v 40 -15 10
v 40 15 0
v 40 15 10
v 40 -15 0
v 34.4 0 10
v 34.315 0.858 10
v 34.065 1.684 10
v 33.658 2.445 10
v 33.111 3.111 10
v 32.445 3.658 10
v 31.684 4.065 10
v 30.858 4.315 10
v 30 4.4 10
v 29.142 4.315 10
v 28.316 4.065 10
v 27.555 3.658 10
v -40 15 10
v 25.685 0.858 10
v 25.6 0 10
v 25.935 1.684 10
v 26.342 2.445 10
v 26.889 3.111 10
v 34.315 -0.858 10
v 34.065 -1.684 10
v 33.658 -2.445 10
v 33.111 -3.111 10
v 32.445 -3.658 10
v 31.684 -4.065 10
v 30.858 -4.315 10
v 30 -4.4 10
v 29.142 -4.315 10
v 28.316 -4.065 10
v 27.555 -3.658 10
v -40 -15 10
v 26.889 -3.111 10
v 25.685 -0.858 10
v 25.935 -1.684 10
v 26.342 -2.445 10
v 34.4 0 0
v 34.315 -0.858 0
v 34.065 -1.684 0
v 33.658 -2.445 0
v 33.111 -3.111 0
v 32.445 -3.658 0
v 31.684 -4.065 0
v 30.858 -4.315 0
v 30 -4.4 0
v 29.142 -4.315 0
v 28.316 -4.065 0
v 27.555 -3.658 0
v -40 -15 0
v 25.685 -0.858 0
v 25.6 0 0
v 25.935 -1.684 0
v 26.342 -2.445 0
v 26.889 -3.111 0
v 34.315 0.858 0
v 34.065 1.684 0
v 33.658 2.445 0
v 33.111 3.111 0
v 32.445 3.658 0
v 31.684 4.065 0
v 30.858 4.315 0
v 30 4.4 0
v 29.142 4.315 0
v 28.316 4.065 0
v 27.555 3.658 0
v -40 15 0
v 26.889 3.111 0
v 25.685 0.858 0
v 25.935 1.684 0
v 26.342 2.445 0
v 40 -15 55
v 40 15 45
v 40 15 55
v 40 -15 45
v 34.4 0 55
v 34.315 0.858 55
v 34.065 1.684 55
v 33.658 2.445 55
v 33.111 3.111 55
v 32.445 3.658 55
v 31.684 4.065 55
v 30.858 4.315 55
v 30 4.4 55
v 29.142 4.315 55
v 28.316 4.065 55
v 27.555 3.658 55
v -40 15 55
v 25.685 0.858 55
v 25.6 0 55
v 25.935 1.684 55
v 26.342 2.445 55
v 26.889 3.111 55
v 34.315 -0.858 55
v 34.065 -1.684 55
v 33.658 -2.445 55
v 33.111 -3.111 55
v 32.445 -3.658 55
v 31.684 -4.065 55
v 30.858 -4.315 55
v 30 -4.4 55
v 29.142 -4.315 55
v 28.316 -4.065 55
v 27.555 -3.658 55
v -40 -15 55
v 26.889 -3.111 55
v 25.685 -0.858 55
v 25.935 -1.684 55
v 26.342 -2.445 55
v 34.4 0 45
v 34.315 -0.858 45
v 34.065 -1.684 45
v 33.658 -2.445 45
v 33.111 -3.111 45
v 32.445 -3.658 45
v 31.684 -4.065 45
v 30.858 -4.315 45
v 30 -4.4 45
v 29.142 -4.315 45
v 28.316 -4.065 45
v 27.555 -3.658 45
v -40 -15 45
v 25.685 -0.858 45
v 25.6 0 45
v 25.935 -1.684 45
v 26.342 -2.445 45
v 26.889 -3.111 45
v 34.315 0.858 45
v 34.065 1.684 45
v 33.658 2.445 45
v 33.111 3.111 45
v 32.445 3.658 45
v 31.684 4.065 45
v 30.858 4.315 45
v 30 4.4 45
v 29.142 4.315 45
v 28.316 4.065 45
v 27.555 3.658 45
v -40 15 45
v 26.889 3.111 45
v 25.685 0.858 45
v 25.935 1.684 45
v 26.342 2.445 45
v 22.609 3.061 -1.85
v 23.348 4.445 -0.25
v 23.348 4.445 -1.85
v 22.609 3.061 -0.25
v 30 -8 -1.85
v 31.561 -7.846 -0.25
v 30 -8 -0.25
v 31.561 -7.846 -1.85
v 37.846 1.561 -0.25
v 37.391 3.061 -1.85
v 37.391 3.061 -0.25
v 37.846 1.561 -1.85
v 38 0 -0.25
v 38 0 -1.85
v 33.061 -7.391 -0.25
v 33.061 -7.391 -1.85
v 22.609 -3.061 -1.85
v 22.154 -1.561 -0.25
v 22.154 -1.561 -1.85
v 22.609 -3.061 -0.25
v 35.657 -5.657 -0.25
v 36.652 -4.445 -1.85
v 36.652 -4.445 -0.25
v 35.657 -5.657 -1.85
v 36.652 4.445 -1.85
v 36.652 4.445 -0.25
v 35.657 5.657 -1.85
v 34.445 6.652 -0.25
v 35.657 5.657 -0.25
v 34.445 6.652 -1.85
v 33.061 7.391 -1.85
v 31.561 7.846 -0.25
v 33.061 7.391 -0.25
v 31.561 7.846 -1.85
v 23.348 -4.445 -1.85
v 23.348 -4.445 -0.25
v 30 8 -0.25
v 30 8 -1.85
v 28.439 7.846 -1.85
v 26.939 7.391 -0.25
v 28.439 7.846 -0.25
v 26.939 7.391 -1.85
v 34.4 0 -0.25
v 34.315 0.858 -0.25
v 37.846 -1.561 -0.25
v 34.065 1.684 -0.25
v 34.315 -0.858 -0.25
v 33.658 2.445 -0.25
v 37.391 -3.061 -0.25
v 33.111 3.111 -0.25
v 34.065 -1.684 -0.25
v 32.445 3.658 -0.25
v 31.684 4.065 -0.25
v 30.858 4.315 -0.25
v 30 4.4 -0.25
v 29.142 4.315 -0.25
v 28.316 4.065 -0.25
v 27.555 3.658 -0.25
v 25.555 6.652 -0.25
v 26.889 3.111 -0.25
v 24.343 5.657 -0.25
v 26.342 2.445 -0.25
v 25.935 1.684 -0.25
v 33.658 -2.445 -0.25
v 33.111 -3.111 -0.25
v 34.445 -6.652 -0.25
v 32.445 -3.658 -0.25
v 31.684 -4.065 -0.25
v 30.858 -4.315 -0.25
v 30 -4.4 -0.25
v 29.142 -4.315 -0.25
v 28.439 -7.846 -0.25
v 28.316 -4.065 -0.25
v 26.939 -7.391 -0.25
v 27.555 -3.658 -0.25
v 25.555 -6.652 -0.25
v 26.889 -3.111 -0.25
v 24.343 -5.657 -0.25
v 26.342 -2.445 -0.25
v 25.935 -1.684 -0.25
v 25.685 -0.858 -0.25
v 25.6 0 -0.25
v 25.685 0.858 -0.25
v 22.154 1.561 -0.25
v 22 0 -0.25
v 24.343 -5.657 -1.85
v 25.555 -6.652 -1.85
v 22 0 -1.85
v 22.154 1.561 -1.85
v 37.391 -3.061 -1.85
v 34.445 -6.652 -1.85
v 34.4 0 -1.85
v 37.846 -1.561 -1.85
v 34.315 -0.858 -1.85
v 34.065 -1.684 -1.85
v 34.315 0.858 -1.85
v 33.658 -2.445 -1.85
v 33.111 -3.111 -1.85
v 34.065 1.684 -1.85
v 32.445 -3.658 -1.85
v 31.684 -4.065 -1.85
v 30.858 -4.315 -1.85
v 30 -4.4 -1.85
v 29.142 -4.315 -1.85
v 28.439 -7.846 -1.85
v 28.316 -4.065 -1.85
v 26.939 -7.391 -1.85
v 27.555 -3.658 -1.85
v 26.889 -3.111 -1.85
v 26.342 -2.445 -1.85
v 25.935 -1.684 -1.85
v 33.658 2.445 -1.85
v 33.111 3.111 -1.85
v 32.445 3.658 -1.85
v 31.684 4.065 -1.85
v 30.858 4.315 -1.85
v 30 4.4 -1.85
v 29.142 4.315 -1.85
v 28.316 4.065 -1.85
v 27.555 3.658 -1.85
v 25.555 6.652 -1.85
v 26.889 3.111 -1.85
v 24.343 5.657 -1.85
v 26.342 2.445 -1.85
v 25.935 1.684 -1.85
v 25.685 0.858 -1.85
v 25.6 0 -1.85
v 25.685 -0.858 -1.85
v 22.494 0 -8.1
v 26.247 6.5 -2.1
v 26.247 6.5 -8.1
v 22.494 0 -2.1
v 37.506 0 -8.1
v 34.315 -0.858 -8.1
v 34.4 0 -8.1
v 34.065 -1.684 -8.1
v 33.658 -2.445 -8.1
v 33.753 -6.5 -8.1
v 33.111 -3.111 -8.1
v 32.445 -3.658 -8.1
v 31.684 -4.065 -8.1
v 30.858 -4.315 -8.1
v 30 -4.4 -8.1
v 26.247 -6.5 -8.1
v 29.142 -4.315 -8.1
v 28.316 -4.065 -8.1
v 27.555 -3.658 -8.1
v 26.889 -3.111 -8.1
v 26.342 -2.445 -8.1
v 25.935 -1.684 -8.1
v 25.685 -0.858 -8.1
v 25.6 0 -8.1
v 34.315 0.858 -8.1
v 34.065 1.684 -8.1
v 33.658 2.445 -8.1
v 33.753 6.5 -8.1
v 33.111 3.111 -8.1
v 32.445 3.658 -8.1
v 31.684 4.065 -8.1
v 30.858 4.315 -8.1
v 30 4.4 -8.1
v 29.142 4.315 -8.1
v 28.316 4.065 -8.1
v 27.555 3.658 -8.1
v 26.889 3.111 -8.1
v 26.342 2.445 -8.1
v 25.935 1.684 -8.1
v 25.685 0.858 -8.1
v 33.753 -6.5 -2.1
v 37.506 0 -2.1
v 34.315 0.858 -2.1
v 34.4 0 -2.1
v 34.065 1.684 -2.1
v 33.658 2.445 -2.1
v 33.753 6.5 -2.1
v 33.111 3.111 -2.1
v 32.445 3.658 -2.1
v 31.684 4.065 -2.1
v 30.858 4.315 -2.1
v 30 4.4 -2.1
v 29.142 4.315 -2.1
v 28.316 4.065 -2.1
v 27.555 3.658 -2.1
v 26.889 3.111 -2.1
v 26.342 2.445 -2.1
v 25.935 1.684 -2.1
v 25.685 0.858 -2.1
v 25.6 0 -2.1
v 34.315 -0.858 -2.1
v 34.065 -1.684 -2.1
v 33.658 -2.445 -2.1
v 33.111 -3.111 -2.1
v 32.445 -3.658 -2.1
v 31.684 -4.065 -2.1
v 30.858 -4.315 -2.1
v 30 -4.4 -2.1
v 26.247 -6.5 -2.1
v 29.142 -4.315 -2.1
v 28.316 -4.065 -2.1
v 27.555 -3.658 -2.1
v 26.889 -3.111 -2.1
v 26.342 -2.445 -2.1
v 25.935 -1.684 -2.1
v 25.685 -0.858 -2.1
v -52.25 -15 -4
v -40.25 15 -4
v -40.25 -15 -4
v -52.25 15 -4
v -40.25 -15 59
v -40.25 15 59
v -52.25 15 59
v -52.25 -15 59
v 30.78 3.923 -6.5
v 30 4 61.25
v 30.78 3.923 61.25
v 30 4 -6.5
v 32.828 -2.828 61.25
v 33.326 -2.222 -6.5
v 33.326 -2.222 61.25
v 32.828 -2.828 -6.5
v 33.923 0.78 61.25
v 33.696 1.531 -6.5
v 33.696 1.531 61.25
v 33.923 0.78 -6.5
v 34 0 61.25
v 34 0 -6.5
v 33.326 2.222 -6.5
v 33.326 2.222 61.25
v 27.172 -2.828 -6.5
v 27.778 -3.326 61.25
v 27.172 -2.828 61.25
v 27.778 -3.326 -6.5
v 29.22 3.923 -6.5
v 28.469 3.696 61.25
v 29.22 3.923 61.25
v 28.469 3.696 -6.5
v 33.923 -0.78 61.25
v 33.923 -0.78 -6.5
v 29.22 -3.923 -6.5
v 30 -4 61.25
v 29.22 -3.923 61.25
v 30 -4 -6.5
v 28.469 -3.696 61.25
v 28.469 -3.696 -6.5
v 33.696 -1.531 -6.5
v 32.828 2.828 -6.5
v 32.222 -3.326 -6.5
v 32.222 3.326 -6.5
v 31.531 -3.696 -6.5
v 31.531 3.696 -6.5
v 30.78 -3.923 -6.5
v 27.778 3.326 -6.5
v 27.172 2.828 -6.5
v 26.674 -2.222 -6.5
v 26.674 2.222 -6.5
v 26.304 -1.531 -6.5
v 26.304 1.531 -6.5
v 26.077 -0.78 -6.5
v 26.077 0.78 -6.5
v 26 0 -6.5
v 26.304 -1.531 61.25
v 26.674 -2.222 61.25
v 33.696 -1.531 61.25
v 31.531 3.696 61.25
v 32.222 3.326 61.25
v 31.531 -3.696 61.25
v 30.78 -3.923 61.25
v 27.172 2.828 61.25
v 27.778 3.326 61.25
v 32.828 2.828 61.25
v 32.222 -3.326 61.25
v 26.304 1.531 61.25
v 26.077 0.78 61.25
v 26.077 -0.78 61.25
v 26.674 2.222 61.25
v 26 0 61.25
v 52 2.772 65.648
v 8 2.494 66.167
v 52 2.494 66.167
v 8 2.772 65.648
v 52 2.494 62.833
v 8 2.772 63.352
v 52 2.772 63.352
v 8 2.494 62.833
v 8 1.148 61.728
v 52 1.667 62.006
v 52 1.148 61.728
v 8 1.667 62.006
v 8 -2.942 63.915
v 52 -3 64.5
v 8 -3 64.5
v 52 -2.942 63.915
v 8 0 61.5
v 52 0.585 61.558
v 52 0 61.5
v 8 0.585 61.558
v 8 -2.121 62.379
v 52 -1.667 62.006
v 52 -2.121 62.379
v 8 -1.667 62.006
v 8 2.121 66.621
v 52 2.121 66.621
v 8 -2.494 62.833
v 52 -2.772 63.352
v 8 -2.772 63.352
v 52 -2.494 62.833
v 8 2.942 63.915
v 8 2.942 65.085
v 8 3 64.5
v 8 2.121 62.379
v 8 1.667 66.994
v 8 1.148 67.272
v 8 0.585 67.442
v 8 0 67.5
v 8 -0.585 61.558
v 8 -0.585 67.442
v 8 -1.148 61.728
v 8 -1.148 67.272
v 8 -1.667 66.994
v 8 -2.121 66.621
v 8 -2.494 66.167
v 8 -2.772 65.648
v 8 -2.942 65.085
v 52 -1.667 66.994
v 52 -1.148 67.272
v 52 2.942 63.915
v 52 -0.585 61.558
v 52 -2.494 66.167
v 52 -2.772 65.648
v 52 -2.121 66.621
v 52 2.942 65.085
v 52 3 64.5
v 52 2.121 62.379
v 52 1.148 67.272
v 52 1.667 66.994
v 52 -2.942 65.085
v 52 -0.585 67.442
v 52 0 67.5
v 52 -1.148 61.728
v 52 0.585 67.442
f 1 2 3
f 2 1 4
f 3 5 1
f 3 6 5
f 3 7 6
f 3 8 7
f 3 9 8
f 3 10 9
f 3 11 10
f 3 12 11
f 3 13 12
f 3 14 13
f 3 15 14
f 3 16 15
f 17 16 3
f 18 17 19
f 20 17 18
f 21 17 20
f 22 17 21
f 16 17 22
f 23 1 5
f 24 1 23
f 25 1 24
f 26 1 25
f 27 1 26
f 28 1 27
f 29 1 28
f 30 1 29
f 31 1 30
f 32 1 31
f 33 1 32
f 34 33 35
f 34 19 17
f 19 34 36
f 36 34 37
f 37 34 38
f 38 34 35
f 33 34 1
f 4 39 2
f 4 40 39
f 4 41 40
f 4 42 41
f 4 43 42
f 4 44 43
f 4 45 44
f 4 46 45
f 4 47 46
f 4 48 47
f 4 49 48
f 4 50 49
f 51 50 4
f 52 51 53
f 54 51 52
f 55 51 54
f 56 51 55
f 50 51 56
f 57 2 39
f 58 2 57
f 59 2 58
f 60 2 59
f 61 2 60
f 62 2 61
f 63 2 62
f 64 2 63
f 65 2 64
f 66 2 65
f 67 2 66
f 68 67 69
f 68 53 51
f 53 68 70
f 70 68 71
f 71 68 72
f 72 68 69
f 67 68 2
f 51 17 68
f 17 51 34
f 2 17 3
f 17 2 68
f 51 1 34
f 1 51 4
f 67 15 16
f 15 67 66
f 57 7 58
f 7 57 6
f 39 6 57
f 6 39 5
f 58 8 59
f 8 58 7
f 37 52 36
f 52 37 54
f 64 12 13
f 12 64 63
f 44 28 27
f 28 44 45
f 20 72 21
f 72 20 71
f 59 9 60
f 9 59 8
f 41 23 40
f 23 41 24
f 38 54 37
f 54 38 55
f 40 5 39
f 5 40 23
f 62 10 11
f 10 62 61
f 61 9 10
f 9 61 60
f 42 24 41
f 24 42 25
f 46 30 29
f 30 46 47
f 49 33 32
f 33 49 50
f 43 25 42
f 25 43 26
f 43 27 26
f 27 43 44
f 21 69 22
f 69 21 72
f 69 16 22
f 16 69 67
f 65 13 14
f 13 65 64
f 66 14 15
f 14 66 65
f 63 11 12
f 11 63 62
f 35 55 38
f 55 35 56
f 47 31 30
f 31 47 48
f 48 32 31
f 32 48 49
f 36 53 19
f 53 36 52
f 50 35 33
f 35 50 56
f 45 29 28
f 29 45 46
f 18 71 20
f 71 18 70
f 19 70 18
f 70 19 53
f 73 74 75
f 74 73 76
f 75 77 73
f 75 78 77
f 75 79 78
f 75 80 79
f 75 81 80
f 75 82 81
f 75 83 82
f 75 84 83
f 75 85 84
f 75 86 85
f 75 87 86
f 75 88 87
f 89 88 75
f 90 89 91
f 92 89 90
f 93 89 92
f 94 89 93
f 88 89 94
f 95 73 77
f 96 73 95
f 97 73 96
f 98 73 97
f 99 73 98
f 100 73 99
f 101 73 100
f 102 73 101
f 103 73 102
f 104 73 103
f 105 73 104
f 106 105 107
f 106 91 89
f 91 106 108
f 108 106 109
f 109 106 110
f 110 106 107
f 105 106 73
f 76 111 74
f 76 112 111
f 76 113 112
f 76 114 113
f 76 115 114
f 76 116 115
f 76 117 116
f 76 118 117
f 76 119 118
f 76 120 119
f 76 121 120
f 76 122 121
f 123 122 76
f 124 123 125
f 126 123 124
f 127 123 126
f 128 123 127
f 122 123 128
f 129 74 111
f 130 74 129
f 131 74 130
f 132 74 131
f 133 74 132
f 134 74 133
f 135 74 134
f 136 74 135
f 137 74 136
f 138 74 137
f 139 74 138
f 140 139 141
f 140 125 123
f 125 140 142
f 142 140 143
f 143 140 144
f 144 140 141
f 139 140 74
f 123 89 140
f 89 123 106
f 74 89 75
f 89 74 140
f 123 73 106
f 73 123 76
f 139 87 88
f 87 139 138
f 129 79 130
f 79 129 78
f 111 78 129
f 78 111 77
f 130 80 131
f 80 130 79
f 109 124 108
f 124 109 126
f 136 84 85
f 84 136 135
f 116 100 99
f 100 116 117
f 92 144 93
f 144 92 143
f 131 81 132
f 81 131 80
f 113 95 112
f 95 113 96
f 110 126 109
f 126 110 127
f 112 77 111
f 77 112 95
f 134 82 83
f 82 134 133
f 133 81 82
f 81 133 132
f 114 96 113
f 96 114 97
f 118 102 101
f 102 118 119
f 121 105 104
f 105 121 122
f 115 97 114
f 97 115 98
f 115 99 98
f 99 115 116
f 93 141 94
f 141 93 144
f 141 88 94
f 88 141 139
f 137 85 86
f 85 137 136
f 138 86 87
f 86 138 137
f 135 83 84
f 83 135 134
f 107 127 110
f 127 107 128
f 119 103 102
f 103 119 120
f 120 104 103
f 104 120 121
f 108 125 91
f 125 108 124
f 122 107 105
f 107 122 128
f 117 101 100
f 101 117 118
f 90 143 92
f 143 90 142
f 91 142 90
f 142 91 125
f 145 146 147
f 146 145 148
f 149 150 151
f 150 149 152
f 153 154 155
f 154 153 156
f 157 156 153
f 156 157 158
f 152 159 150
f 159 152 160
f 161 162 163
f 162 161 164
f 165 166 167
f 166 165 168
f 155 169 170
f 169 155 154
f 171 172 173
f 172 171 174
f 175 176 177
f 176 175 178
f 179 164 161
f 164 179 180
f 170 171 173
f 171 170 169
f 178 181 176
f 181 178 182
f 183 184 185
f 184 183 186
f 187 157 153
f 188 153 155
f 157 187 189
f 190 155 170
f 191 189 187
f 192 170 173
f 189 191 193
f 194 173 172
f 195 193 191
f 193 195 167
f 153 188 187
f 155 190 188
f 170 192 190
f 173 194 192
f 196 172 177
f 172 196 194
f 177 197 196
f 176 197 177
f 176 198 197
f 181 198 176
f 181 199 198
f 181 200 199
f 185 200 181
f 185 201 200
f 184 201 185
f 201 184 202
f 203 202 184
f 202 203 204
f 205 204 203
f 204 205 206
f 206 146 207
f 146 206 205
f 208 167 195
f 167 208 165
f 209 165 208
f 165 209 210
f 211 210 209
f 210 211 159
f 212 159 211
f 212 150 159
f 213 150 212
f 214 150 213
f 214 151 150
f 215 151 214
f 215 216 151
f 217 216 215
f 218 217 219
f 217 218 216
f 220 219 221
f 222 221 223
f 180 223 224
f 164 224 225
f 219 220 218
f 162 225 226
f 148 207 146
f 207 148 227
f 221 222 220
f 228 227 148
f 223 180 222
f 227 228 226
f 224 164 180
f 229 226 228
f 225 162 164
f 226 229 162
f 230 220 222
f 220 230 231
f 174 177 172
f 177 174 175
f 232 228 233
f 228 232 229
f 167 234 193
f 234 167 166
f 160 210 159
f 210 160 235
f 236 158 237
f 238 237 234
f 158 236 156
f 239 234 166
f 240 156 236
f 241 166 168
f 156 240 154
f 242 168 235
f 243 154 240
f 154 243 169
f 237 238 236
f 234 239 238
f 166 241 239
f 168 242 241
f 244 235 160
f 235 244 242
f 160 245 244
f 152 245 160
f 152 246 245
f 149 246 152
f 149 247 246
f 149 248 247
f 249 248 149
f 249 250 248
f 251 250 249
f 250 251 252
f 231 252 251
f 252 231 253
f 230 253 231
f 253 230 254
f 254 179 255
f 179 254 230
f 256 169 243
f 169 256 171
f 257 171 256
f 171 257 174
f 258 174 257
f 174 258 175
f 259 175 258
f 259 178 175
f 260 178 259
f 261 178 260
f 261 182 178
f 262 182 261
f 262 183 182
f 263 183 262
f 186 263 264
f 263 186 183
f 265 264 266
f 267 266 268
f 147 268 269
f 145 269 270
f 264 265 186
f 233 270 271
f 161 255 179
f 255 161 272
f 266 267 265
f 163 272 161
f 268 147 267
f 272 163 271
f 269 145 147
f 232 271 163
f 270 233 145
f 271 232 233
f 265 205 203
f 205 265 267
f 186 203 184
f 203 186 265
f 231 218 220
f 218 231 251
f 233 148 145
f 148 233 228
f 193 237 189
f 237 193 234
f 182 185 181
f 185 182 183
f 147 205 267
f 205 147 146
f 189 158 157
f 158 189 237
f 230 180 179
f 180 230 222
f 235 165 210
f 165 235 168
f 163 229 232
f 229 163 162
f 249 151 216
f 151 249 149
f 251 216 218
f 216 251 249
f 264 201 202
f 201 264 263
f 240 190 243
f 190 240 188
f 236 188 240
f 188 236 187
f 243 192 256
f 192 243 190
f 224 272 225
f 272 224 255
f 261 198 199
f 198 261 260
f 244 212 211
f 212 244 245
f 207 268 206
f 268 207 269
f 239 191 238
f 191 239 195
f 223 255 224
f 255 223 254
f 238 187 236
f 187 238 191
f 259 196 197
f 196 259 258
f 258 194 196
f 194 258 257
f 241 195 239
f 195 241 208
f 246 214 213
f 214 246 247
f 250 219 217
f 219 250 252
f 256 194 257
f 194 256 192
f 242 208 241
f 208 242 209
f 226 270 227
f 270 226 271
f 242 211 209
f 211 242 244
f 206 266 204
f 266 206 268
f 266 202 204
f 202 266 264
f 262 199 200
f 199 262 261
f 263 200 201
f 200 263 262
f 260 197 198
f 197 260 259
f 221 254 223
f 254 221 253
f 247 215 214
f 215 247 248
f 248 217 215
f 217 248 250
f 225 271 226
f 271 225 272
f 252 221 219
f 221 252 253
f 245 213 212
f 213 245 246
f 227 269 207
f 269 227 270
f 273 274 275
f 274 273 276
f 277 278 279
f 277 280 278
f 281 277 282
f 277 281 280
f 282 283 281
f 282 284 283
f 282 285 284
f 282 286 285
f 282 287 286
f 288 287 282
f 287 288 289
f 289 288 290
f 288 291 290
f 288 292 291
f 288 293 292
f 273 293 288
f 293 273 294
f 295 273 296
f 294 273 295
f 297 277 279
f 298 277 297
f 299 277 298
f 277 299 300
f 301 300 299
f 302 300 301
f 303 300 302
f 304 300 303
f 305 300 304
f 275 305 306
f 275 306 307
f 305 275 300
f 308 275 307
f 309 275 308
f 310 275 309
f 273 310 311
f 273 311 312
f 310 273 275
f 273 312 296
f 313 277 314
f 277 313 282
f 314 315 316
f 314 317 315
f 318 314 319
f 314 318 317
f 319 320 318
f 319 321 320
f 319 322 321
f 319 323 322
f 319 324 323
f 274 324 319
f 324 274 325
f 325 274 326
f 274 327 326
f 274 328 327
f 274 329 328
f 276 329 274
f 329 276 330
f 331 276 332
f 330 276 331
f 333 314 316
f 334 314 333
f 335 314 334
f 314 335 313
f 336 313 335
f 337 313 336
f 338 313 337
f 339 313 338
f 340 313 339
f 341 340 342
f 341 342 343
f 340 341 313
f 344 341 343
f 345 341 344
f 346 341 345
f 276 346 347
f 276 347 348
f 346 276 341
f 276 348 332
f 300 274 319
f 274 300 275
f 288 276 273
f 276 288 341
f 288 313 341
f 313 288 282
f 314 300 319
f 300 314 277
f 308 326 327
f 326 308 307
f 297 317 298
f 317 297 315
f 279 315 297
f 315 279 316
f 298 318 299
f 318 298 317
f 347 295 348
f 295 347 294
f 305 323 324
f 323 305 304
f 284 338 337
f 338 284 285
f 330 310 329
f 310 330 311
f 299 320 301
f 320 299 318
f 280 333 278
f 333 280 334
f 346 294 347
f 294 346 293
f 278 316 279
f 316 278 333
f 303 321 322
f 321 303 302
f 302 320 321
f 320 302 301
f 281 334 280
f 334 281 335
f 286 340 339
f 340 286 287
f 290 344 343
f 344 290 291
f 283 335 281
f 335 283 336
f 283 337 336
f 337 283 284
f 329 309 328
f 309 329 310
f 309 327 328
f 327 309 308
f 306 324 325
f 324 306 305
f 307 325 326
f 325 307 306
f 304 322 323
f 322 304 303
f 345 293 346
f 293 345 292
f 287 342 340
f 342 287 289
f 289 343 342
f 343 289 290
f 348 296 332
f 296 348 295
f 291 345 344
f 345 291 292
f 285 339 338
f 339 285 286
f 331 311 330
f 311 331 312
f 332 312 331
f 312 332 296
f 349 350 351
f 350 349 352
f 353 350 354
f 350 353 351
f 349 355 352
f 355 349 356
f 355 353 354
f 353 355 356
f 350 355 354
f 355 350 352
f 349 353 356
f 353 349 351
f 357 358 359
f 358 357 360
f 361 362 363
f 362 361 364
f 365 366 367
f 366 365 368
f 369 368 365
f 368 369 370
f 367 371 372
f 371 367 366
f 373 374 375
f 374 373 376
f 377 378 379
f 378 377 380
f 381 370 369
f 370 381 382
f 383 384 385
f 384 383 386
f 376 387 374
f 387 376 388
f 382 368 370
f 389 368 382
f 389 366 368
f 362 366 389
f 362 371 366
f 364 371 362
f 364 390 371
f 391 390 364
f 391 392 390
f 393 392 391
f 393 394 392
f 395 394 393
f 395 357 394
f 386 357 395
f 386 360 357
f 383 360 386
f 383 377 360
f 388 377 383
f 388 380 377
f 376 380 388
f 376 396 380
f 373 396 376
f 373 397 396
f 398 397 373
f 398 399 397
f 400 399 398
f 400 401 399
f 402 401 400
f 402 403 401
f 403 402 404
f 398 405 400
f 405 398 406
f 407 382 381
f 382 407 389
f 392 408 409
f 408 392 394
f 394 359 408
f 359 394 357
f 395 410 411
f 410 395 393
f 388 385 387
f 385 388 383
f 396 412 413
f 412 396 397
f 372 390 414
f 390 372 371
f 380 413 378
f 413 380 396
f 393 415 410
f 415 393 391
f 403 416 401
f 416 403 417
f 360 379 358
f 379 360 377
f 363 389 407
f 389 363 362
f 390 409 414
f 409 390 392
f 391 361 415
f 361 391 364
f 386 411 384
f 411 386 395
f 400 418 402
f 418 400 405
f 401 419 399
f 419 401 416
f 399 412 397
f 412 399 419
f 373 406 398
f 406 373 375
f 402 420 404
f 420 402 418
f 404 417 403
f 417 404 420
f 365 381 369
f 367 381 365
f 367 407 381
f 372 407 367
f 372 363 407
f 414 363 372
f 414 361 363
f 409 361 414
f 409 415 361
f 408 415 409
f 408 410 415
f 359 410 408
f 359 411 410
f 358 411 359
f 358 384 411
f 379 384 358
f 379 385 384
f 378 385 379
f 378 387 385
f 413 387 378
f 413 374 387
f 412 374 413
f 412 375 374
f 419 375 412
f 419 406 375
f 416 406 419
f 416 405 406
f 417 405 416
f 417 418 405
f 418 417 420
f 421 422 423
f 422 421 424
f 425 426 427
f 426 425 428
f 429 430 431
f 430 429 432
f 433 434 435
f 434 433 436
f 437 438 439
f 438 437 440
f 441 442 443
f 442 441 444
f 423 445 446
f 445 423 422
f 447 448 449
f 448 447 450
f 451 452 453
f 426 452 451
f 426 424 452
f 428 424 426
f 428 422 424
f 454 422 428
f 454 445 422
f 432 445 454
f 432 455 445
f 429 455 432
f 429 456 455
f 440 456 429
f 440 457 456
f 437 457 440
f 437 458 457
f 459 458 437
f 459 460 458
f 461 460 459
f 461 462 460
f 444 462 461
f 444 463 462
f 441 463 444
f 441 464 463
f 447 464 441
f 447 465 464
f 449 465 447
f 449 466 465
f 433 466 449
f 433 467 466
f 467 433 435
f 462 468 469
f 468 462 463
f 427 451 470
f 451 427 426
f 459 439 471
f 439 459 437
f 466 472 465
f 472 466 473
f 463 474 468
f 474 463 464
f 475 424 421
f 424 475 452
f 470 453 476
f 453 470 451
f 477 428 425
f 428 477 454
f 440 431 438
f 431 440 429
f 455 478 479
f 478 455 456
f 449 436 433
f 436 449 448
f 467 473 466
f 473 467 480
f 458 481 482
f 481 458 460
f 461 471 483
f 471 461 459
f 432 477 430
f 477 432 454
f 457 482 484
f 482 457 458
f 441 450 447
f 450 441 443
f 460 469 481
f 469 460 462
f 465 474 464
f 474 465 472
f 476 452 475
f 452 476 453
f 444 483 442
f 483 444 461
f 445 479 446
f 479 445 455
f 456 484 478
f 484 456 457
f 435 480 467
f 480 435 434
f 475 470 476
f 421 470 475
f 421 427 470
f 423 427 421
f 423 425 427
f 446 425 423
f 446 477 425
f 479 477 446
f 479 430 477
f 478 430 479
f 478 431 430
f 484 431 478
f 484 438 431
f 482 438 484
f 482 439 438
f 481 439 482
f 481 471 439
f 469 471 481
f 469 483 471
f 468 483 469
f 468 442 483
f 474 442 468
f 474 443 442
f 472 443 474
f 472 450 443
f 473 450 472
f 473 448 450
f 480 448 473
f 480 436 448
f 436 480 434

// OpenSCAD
$fn = 32;

// ------------------------------------------------------------------------
// C clamp: throat 45 mm, screw d8
// Every part is its own module, assembly() places every instance.
// ------------------------------------------------------------------------

// --- part 1 ---
module clamp_arm() {
  difference() {
    translate([-40, -15, 0]) cube([80, 30, 10]);
    translate([30, 0, -1]) cylinder(h = 12, d = 8.8);
  }
}

// --- part 2 ---
module clamp_spine() {
  difference() {
    translate([-31.5, -15, 0]) cube([63, 30, 12]);
  }
}

// --- part 3 ---
module clamp_screw() {
  translate([0, 0, -33.875]) cylinder(h = 67.75, d = 8);
}

// --- part 4 ---
module clamp_washer() {
  difference() {
      translate([0, 0, 0]) cylinder(h = 1.6, d = 16);
      translate([0, 0, -1]) cylinder(h = 3.6, d = 8.8);
    }
}

// --- part 5 ---
module clamp_nut() {
  difference() {
    linear_extrude(height = 6) polygon(points = [[7.506, 0], [3.753, 6.5], [-3.753, 6.5], [-7.506, 0], [-3.753, -6.5], [3.753, -6.5]]);
    translate([0, 0, -1]) cylinder(h = 8, d = 8.8);
  }
}

// --- part 6 ---
module tommy_bar() {
  translate([0, 0, -22]) cylinder(h = 44, d = 6);
}

// --- assembly ---
module assembly() {
  color([0.80, 0.24, 0.20]) translate([0, 0, 0]) rotate([0, 0, 0]) clamp_arm();
  color([0.20, 0.45, 0.75]) translate([0, 0, 45]) rotate([0, 0, 0]) clamp_arm();
  color([0.25, 0.62, 0.32]) translate([-52.25, 0, 27.5]) rotate([0, 90, 0]) clamp_spine();
  color([0.92, 0.70, 0.18]) translate([30, 0, 27.375]) rotate([0, 0, 0]) clamp_screw();
  color([0.58, 0.35, 0.70]) translate([30, 0, -1.85]) rotate([0, 0, 0]) clamp_washer();
  color([0.16, 0.66, 0.66]) translate([30, 0, -8.1]) rotate([0, 0, 0]) clamp_nut();
  color([0.85, 0.48, 0.18]) translate([30, 0, 64.5]) rotate([0, 90, 0]) tommy_bar();
}

assembly();
